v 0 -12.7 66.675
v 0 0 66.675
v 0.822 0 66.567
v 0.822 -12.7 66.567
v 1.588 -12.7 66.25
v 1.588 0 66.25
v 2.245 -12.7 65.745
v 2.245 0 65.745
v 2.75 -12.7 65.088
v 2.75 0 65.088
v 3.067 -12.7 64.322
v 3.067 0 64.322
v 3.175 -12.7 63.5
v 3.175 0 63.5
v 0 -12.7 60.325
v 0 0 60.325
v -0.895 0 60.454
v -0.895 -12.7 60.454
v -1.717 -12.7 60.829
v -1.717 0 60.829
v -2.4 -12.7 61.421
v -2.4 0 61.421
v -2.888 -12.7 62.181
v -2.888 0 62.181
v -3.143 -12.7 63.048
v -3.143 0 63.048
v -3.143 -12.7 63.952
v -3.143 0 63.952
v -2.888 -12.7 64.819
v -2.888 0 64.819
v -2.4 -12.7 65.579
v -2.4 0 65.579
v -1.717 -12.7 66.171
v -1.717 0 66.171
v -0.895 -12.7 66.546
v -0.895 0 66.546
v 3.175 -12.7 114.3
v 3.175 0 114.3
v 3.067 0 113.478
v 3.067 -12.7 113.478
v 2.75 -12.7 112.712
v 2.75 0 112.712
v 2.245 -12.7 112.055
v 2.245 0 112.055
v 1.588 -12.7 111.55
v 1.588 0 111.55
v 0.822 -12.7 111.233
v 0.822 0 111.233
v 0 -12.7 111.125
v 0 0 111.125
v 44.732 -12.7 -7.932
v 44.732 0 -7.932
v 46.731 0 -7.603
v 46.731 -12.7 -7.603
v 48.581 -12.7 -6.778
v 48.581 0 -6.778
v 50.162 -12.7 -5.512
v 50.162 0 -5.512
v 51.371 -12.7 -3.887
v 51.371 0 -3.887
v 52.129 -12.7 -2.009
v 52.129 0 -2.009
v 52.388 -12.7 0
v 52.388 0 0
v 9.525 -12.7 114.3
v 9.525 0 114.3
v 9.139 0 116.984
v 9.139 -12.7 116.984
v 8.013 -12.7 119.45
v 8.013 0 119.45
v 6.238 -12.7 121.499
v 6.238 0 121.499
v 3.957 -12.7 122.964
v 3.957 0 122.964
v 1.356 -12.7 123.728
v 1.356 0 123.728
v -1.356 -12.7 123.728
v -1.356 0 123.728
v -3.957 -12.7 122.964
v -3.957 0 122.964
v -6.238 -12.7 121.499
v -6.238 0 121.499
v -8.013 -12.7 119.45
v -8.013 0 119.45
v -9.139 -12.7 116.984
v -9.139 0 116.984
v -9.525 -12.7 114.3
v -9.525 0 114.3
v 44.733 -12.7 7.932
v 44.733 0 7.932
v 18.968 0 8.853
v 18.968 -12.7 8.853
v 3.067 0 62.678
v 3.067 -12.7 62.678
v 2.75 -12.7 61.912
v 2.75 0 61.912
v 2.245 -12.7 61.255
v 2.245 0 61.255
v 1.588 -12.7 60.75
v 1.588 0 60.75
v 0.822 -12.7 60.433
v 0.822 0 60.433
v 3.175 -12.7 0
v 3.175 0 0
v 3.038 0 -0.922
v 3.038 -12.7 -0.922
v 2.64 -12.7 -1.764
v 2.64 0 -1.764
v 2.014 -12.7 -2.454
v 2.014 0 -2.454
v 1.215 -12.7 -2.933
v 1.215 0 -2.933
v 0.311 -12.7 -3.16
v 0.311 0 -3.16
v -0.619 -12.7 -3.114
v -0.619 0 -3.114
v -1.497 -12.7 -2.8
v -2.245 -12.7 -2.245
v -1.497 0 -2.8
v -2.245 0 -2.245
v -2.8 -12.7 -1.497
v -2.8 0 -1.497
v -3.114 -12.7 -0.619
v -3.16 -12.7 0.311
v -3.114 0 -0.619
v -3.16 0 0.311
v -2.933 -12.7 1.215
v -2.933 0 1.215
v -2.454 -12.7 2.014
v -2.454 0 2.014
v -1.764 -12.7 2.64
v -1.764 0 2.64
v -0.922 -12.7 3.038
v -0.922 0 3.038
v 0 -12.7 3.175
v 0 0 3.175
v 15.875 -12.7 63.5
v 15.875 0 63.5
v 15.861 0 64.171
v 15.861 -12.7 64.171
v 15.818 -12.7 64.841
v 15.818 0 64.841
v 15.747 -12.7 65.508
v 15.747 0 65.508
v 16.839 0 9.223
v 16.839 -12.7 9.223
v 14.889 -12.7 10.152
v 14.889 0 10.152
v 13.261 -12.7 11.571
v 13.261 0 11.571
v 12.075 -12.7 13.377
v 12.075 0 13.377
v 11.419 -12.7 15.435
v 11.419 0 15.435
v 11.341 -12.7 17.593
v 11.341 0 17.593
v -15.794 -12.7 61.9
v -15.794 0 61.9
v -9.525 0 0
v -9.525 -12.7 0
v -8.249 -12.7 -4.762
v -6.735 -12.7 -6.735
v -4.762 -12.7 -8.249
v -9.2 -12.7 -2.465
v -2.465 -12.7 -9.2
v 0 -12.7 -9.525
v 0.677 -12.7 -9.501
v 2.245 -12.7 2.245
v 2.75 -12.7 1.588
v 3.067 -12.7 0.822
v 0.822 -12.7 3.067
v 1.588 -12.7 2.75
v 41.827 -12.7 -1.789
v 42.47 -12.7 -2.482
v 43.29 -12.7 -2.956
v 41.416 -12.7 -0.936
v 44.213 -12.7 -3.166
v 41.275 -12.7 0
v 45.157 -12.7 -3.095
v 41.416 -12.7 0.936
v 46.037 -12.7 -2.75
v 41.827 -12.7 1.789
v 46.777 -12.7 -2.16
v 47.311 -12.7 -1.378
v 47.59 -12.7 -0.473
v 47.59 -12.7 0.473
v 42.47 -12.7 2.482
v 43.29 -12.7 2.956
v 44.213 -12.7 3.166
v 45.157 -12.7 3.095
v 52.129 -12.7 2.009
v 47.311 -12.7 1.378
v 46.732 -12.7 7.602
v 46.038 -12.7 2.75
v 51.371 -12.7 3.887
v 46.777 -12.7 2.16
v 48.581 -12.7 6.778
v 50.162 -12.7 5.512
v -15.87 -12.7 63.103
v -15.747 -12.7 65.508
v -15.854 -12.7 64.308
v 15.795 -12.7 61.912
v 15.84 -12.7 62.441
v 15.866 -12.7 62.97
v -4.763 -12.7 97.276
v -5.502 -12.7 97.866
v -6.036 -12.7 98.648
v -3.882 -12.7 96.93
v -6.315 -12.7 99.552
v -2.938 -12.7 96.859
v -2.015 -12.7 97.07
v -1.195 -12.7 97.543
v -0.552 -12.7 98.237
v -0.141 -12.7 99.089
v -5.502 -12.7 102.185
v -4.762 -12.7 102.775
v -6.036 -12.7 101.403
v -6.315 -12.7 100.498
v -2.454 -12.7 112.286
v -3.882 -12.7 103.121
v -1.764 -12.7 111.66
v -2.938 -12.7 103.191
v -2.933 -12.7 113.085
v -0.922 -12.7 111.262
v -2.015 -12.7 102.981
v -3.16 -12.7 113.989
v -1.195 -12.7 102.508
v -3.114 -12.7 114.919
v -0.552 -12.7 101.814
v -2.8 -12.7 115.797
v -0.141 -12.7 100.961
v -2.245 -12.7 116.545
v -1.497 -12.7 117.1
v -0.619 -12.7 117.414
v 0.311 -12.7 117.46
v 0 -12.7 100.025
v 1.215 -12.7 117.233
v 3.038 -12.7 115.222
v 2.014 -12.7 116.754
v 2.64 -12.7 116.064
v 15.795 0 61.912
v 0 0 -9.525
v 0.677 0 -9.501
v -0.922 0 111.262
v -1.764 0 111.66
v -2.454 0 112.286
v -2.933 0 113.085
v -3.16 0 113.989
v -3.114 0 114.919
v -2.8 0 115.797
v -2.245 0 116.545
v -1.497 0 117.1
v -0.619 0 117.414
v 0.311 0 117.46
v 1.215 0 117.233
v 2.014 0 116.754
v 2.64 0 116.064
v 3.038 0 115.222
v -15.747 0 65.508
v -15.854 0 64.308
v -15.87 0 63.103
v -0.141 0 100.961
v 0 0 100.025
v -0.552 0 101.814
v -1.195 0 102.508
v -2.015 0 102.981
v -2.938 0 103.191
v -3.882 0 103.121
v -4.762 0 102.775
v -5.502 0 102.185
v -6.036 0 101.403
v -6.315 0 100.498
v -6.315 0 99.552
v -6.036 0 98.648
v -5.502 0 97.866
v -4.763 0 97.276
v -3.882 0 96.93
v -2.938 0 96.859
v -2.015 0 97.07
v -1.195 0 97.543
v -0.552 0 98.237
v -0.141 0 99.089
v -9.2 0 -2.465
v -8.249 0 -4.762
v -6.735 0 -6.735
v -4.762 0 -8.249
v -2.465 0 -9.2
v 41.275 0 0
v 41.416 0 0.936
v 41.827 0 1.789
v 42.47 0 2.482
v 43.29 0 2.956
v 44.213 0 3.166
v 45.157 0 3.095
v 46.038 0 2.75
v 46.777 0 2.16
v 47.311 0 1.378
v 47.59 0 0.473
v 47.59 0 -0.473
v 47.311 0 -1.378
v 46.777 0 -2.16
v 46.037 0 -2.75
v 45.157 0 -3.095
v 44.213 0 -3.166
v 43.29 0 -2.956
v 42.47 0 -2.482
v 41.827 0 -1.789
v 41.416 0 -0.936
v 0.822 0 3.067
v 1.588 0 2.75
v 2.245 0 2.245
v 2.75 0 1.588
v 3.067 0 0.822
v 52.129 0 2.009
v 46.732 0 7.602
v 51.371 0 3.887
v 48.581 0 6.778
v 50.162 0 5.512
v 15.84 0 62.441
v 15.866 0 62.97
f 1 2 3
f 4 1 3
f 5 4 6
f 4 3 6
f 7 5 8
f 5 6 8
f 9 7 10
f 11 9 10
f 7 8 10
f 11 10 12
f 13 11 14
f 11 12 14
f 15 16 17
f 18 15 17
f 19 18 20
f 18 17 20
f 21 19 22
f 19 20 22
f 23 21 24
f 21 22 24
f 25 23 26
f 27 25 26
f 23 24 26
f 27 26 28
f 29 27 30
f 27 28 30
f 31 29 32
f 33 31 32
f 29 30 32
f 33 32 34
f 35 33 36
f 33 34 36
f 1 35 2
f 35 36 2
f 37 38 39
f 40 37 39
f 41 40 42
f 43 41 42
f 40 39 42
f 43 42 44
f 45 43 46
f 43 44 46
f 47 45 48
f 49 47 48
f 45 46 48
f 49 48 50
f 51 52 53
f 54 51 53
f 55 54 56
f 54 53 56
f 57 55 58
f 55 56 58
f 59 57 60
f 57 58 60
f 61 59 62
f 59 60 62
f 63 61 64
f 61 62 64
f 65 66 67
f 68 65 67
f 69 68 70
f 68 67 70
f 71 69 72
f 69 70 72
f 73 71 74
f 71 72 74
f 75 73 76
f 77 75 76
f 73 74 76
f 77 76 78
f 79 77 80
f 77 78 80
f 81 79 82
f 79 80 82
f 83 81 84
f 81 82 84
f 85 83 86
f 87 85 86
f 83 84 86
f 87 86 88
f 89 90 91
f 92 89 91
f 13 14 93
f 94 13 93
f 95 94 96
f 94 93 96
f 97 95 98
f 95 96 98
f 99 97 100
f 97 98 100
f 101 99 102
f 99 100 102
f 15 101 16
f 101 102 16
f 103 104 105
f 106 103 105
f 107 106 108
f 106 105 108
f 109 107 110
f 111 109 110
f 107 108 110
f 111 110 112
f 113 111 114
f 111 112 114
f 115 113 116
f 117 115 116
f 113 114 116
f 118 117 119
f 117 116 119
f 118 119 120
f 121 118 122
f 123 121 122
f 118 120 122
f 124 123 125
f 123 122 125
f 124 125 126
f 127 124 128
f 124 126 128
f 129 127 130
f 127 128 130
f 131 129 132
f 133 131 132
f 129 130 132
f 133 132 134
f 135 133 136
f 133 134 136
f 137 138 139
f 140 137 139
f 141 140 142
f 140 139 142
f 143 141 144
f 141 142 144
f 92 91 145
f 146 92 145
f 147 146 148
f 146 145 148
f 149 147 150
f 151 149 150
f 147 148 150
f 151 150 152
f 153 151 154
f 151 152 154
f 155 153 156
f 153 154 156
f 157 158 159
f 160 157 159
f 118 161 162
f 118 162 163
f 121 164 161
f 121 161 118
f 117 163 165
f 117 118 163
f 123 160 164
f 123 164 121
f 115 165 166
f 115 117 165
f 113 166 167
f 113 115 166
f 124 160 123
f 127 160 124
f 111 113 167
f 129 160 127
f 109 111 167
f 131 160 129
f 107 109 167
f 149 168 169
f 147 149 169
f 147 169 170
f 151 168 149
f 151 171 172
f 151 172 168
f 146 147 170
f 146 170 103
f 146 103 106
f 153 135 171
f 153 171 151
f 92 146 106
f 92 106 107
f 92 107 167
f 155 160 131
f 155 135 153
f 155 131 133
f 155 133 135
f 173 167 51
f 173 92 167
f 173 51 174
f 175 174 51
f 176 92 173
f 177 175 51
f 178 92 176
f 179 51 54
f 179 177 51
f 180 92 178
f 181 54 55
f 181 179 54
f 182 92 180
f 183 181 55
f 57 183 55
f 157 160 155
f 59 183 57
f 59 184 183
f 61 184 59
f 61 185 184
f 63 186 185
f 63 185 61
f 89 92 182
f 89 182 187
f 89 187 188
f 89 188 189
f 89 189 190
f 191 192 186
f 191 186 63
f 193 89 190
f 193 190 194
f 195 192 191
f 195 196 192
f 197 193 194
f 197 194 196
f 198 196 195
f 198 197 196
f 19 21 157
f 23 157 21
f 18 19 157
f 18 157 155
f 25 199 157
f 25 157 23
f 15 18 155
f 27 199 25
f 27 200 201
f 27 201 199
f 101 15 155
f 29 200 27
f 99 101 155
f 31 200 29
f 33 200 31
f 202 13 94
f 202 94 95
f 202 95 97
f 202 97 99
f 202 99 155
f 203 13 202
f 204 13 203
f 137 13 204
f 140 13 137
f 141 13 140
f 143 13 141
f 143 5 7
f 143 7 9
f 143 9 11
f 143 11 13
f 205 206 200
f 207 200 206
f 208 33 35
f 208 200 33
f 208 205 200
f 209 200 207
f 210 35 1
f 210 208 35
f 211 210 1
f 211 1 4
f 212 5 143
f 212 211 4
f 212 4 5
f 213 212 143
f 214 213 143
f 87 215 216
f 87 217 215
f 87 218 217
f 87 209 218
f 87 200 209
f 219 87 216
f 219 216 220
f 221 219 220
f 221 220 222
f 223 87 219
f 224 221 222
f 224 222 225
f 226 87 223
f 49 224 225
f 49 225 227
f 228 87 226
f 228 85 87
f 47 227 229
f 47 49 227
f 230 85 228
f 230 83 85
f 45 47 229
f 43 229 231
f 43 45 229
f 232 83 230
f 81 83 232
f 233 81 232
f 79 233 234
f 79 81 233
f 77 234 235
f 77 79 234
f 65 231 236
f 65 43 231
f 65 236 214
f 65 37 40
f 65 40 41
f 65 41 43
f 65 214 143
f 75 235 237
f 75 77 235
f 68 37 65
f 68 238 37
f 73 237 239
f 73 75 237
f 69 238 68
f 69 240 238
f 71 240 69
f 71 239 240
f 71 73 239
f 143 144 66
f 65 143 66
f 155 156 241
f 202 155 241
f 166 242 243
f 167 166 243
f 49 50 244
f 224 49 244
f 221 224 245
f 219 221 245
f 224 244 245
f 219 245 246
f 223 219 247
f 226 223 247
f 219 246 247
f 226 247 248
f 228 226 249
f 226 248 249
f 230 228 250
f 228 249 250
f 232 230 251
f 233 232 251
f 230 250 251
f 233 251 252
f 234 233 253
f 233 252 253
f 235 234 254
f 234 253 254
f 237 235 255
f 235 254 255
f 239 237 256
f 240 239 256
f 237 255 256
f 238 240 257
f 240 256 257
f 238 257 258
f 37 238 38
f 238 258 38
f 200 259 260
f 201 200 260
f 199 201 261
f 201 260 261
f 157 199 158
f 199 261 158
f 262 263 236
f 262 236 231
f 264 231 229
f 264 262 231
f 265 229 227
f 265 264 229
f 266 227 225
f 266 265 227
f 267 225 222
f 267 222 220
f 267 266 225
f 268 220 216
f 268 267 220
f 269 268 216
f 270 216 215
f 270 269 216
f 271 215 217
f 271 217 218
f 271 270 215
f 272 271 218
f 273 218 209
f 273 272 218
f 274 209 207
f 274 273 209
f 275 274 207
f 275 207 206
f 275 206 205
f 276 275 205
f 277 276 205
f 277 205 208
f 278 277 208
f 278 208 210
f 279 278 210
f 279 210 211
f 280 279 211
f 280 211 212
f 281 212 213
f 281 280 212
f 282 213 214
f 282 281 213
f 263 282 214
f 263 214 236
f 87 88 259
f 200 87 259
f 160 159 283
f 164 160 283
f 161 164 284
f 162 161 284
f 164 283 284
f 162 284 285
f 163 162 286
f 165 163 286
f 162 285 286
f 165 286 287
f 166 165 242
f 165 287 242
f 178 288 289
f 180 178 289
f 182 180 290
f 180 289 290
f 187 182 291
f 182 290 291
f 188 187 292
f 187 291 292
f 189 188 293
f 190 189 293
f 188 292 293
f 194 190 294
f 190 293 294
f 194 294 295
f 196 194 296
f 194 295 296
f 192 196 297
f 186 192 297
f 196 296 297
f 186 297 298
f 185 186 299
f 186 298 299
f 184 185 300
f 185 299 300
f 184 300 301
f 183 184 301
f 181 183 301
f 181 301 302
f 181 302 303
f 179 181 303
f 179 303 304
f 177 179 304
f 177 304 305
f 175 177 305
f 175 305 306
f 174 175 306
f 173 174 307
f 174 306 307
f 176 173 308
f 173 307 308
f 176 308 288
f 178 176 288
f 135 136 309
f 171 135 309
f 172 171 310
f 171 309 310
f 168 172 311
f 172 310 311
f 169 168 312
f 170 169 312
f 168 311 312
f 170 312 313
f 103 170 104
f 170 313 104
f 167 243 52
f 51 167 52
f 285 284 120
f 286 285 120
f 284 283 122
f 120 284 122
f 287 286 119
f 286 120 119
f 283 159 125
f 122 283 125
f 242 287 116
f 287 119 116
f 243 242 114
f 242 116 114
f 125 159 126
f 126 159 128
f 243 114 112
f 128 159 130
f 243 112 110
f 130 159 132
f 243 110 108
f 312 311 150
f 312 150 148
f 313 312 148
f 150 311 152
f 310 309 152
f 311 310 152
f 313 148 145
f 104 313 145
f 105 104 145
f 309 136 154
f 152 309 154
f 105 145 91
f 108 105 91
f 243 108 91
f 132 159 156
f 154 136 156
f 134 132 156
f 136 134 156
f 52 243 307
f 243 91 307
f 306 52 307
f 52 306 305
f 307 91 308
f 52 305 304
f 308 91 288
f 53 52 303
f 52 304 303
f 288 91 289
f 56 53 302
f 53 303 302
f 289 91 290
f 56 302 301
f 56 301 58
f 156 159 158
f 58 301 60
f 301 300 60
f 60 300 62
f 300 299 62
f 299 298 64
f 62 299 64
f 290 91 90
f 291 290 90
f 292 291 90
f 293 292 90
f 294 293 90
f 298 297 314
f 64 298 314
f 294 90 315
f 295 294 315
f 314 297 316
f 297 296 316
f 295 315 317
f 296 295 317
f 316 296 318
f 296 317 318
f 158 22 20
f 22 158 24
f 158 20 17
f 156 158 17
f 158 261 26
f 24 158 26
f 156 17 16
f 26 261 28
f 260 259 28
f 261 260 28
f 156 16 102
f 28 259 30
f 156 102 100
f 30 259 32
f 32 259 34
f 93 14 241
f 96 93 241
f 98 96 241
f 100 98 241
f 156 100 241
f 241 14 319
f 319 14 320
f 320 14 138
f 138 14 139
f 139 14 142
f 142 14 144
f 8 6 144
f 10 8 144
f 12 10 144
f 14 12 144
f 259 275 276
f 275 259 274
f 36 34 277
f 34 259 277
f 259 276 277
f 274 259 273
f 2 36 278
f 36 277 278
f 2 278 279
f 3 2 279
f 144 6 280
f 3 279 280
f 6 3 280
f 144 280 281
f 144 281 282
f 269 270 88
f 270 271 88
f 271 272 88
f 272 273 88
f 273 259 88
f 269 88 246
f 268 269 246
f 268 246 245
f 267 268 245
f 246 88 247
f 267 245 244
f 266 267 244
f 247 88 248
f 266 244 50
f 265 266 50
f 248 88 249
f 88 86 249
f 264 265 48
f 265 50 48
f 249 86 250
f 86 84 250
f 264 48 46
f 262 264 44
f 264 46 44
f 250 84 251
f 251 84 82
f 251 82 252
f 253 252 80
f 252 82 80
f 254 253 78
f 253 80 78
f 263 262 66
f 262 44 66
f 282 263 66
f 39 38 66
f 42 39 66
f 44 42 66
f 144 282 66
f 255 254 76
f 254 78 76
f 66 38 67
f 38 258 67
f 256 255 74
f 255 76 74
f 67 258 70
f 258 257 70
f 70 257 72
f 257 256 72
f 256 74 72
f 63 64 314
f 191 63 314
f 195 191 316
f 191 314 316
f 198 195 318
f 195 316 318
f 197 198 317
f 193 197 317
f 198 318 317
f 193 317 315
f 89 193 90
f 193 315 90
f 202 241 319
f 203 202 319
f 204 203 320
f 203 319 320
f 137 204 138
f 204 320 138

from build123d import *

# Parameters (mm, degrees)
F0_R     = 3.175
F1_DEPTH = 12.7


# Not quite as in the source:
# - a feature names something its author has since deleted; it is built from what else it names


with BuildPart() as f1:
    # F0 (on Front) → F1 (new body)
    with BuildSketch(Plane.XZ):
        with BuildLine():
            Line((0, 9.525), (0, 3.175))
            ThreePointArc((0, 3.175), (2.2450640303, 2.2450640303), (3.175, 0))
            Line((3.175, 0), (9.525, 0))
            ThreePointArc((9.525, 0), (6.7351920908, 6.7351920908), (0, 9.525))
        make_face()
        with BuildLine():
            ThreePointArc((3.175, 0), (-2.2450640303, -2.2450640303), (0, 3.175))
            Line((0, 3.175), (0, 9.525))
            ThreePointArc((0, 9.525), (-6.7351920908, 6.7351920908), (-9.525, 0))
            ThreePointArc((-9.525, 0), (-6.7351920908, -6.7351920908), (0, -9.525))
            Line((0, -9.525), (0.6773435479, -9.500885786))
            ThreePointArc((0.6773435479, -9.500885786), (6.9705567315, -6.4912990883), (9.525, 0))
            Line((9.525, 0), (3.175, 0))
        make_face()
        with BuildLine():
            ThreePointArc((-9.525, 0), (-6.7351920908, 6.7351920908), (0, 9.525))
            Line((0, 9.525), (0, 47.625))
            ThreePointArc((0, 47.625), (-10.644756084, 51.722700101), (-15.7942028036, 61.9003804205))
            Line((-15.7942028036, 61.9003804205), (-9.525, 0))
        make_face()
        with BuildLine():
            Line((0, 47.625), (0, 9.525))
            ThreePointArc((0, 9.525), (6.7351920908, 6.7351920908), (9.525, 0))
            Line((9.525, 0), (36.5125, 0))
            ThreePointArc((36.5125, 0), (38.9384772185, 5.7120069047), (44.7334821429, 7.9324362036))
            Line((44.7334821429, 7.9324362036), (18.9676000005, 8.8532337108))
            ThreePointArc((18.9676000005, 8.8532337108), (13.2611998974, 11.5713591498), (11.3411865923, 17.5933818124))
            Line((11.3411865923, 17.5933818124), (15.7954255641, 61.9125))
            ThreePointArc((15.7954255641, 61.9125), (10.6492737428, 51.7267849017), (0, 47.625))
        make_face()
        with BuildLine():
            Line((36.5125, 0), (9.525, 0))
            ThreePointArc((9.525, 0), (6.9705567315, -6.4912990883), (0.6773435479, -9.500885786))
            Line((0.6773435479, -9.500885786), (44.7324052746, -7.9324746146))
            ThreePointArc((44.7324052746, -7.9324746146), (38.9380895153, -5.7116327839), (36.5125, 0))
        make_face()
        with BuildLine():
            ThreePointArc((44.7334821429, 7.9324362036), (38.9384772185, 5.7120069047), (36.5125, 0))
            ThreePointArc((36.5125, 0), (38.9380895153, -5.7116327839), (44.7324052746, -7.9324746146))
            ThreePointArc((44.7324052746, -7.9324746146), (50.1616327839, -5.5119104847), (52.3875, 0))
            ThreePointArc((52.3875, 0), (50.1620069047, 5.5115227815), (44.7334821429, 7.9324362036))
        make_face()
        with BuildLine():
            ThreePointArc((47.625, 0), (44.45, -3.175), (41.275, 0))
            ThreePointArc((41.275, 0), (44.45, 3.175), (47.625, 0))
        make_face(mode=Mode.SUBTRACT)
        with BuildLine():
            Line((0, 60.325), (0, 47.625))
            ThreePointArc((0, 47.625), (10.6492737428, 51.7267849017), (15.7954255641, 61.9125))
            ThreePointArc((15.7954255641, 61.9125), (15.8550939106, 62.7052534459), (15.875, 63.5))
            ThreePointArc((15.875, 63.5), (15.8430821396, 64.5061676396), (15.7474569047, 65.5082893304))
            ThreePointArc((15.7474569047, 65.5082893304), (10.4912828548, 75.4142187767), (0, 79.375))
            Line((0, 79.375), (0, 66.675))
            ThreePointArc((0, 66.675), (2.2450640303, 65.7450640303), (3.175, 63.5))
            ThreePointArc((3.175, 63.5), (2.2450640303, 61.2549359697), (0, 60.325))
        make_face()
        with BuildLine():
            ThreePointArc((-15.7942028036, 61.9003804205), (-10.644756084, 51.722700101), (0, 47.625))
            Line((0, 47.625), (0, 60.325))
            ThreePointArc((0, 60.325), (-3.175, 63.5), (0, 66.675))
            Line((0, 66.675), (0, 79.375))
            ThreePointArc((0, 79.375), (-10.4912828548, 75.4142187767), (-15.7474569047, 65.5082893304))
            ThreePointArc((-15.7474569047, 65.5082893304), (-15.873667691, 63.7056672947), (-15.7942028036, 61.9003804205))
        make_face()
        with BuildLine():
            Line((0, 100.0252), (0, 79.375))
            ThreePointArc((0, 79.375), (10.4912828548, 75.4142187767), (15.7474569047, 65.5082893304))
            Line((15.7474569047, 65.5082893304), (9.525, 114.3))
            ThreePointArc((9.525, 114.3), (6.7351920908, 107.5648079092), (0, 104.775))
            Line((0, 104.775), (0, 100.0252))
        make_face()
        with BuildLine():
            Line((-9.525, 114.3), (-15.7474569047, 65.5082893304))
            ThreePointArc((-15.7474569047, 65.5082893304), (-10.4912828548, 75.4142187767), (0, 79.375))
            Line((0, 79.375), (0, 100.0252))
            Line((0, 100.0252), (0, 104.775))
            ThreePointArc((0, 104.775), (-6.7351920908, 107.5648079092), (-9.525, 114.3))
        make_face()
        with Locations((-3.175, 100.0252)):
            Circle(F0_R, mode=Mode.SUBTRACT)
        with BuildLine():
            ThreePointArc((9.525, 114.3), (0, 123.825), (-9.525, 114.3))
            ThreePointArc((-9.525, 114.3), (-6.7351920908, 107.5648079092), (0, 104.775))
            ThreePointArc((0, 104.775), (6.7351920908, 107.5648079092), (9.525, 114.3))
        make_face()
        with BuildLine():
            ThreePointArc((3.175, 114.3), (2.2450640303, 112.0549359697), (0, 111.125))
            ThreePointArc((0, 111.125), (-2.2450640303, 116.5450640303), (3.175, 114.3))
        make_face(mode=Mode.SUBTRACT)
    extrude(amount=F1_DEPTH)


solid = f1.part
